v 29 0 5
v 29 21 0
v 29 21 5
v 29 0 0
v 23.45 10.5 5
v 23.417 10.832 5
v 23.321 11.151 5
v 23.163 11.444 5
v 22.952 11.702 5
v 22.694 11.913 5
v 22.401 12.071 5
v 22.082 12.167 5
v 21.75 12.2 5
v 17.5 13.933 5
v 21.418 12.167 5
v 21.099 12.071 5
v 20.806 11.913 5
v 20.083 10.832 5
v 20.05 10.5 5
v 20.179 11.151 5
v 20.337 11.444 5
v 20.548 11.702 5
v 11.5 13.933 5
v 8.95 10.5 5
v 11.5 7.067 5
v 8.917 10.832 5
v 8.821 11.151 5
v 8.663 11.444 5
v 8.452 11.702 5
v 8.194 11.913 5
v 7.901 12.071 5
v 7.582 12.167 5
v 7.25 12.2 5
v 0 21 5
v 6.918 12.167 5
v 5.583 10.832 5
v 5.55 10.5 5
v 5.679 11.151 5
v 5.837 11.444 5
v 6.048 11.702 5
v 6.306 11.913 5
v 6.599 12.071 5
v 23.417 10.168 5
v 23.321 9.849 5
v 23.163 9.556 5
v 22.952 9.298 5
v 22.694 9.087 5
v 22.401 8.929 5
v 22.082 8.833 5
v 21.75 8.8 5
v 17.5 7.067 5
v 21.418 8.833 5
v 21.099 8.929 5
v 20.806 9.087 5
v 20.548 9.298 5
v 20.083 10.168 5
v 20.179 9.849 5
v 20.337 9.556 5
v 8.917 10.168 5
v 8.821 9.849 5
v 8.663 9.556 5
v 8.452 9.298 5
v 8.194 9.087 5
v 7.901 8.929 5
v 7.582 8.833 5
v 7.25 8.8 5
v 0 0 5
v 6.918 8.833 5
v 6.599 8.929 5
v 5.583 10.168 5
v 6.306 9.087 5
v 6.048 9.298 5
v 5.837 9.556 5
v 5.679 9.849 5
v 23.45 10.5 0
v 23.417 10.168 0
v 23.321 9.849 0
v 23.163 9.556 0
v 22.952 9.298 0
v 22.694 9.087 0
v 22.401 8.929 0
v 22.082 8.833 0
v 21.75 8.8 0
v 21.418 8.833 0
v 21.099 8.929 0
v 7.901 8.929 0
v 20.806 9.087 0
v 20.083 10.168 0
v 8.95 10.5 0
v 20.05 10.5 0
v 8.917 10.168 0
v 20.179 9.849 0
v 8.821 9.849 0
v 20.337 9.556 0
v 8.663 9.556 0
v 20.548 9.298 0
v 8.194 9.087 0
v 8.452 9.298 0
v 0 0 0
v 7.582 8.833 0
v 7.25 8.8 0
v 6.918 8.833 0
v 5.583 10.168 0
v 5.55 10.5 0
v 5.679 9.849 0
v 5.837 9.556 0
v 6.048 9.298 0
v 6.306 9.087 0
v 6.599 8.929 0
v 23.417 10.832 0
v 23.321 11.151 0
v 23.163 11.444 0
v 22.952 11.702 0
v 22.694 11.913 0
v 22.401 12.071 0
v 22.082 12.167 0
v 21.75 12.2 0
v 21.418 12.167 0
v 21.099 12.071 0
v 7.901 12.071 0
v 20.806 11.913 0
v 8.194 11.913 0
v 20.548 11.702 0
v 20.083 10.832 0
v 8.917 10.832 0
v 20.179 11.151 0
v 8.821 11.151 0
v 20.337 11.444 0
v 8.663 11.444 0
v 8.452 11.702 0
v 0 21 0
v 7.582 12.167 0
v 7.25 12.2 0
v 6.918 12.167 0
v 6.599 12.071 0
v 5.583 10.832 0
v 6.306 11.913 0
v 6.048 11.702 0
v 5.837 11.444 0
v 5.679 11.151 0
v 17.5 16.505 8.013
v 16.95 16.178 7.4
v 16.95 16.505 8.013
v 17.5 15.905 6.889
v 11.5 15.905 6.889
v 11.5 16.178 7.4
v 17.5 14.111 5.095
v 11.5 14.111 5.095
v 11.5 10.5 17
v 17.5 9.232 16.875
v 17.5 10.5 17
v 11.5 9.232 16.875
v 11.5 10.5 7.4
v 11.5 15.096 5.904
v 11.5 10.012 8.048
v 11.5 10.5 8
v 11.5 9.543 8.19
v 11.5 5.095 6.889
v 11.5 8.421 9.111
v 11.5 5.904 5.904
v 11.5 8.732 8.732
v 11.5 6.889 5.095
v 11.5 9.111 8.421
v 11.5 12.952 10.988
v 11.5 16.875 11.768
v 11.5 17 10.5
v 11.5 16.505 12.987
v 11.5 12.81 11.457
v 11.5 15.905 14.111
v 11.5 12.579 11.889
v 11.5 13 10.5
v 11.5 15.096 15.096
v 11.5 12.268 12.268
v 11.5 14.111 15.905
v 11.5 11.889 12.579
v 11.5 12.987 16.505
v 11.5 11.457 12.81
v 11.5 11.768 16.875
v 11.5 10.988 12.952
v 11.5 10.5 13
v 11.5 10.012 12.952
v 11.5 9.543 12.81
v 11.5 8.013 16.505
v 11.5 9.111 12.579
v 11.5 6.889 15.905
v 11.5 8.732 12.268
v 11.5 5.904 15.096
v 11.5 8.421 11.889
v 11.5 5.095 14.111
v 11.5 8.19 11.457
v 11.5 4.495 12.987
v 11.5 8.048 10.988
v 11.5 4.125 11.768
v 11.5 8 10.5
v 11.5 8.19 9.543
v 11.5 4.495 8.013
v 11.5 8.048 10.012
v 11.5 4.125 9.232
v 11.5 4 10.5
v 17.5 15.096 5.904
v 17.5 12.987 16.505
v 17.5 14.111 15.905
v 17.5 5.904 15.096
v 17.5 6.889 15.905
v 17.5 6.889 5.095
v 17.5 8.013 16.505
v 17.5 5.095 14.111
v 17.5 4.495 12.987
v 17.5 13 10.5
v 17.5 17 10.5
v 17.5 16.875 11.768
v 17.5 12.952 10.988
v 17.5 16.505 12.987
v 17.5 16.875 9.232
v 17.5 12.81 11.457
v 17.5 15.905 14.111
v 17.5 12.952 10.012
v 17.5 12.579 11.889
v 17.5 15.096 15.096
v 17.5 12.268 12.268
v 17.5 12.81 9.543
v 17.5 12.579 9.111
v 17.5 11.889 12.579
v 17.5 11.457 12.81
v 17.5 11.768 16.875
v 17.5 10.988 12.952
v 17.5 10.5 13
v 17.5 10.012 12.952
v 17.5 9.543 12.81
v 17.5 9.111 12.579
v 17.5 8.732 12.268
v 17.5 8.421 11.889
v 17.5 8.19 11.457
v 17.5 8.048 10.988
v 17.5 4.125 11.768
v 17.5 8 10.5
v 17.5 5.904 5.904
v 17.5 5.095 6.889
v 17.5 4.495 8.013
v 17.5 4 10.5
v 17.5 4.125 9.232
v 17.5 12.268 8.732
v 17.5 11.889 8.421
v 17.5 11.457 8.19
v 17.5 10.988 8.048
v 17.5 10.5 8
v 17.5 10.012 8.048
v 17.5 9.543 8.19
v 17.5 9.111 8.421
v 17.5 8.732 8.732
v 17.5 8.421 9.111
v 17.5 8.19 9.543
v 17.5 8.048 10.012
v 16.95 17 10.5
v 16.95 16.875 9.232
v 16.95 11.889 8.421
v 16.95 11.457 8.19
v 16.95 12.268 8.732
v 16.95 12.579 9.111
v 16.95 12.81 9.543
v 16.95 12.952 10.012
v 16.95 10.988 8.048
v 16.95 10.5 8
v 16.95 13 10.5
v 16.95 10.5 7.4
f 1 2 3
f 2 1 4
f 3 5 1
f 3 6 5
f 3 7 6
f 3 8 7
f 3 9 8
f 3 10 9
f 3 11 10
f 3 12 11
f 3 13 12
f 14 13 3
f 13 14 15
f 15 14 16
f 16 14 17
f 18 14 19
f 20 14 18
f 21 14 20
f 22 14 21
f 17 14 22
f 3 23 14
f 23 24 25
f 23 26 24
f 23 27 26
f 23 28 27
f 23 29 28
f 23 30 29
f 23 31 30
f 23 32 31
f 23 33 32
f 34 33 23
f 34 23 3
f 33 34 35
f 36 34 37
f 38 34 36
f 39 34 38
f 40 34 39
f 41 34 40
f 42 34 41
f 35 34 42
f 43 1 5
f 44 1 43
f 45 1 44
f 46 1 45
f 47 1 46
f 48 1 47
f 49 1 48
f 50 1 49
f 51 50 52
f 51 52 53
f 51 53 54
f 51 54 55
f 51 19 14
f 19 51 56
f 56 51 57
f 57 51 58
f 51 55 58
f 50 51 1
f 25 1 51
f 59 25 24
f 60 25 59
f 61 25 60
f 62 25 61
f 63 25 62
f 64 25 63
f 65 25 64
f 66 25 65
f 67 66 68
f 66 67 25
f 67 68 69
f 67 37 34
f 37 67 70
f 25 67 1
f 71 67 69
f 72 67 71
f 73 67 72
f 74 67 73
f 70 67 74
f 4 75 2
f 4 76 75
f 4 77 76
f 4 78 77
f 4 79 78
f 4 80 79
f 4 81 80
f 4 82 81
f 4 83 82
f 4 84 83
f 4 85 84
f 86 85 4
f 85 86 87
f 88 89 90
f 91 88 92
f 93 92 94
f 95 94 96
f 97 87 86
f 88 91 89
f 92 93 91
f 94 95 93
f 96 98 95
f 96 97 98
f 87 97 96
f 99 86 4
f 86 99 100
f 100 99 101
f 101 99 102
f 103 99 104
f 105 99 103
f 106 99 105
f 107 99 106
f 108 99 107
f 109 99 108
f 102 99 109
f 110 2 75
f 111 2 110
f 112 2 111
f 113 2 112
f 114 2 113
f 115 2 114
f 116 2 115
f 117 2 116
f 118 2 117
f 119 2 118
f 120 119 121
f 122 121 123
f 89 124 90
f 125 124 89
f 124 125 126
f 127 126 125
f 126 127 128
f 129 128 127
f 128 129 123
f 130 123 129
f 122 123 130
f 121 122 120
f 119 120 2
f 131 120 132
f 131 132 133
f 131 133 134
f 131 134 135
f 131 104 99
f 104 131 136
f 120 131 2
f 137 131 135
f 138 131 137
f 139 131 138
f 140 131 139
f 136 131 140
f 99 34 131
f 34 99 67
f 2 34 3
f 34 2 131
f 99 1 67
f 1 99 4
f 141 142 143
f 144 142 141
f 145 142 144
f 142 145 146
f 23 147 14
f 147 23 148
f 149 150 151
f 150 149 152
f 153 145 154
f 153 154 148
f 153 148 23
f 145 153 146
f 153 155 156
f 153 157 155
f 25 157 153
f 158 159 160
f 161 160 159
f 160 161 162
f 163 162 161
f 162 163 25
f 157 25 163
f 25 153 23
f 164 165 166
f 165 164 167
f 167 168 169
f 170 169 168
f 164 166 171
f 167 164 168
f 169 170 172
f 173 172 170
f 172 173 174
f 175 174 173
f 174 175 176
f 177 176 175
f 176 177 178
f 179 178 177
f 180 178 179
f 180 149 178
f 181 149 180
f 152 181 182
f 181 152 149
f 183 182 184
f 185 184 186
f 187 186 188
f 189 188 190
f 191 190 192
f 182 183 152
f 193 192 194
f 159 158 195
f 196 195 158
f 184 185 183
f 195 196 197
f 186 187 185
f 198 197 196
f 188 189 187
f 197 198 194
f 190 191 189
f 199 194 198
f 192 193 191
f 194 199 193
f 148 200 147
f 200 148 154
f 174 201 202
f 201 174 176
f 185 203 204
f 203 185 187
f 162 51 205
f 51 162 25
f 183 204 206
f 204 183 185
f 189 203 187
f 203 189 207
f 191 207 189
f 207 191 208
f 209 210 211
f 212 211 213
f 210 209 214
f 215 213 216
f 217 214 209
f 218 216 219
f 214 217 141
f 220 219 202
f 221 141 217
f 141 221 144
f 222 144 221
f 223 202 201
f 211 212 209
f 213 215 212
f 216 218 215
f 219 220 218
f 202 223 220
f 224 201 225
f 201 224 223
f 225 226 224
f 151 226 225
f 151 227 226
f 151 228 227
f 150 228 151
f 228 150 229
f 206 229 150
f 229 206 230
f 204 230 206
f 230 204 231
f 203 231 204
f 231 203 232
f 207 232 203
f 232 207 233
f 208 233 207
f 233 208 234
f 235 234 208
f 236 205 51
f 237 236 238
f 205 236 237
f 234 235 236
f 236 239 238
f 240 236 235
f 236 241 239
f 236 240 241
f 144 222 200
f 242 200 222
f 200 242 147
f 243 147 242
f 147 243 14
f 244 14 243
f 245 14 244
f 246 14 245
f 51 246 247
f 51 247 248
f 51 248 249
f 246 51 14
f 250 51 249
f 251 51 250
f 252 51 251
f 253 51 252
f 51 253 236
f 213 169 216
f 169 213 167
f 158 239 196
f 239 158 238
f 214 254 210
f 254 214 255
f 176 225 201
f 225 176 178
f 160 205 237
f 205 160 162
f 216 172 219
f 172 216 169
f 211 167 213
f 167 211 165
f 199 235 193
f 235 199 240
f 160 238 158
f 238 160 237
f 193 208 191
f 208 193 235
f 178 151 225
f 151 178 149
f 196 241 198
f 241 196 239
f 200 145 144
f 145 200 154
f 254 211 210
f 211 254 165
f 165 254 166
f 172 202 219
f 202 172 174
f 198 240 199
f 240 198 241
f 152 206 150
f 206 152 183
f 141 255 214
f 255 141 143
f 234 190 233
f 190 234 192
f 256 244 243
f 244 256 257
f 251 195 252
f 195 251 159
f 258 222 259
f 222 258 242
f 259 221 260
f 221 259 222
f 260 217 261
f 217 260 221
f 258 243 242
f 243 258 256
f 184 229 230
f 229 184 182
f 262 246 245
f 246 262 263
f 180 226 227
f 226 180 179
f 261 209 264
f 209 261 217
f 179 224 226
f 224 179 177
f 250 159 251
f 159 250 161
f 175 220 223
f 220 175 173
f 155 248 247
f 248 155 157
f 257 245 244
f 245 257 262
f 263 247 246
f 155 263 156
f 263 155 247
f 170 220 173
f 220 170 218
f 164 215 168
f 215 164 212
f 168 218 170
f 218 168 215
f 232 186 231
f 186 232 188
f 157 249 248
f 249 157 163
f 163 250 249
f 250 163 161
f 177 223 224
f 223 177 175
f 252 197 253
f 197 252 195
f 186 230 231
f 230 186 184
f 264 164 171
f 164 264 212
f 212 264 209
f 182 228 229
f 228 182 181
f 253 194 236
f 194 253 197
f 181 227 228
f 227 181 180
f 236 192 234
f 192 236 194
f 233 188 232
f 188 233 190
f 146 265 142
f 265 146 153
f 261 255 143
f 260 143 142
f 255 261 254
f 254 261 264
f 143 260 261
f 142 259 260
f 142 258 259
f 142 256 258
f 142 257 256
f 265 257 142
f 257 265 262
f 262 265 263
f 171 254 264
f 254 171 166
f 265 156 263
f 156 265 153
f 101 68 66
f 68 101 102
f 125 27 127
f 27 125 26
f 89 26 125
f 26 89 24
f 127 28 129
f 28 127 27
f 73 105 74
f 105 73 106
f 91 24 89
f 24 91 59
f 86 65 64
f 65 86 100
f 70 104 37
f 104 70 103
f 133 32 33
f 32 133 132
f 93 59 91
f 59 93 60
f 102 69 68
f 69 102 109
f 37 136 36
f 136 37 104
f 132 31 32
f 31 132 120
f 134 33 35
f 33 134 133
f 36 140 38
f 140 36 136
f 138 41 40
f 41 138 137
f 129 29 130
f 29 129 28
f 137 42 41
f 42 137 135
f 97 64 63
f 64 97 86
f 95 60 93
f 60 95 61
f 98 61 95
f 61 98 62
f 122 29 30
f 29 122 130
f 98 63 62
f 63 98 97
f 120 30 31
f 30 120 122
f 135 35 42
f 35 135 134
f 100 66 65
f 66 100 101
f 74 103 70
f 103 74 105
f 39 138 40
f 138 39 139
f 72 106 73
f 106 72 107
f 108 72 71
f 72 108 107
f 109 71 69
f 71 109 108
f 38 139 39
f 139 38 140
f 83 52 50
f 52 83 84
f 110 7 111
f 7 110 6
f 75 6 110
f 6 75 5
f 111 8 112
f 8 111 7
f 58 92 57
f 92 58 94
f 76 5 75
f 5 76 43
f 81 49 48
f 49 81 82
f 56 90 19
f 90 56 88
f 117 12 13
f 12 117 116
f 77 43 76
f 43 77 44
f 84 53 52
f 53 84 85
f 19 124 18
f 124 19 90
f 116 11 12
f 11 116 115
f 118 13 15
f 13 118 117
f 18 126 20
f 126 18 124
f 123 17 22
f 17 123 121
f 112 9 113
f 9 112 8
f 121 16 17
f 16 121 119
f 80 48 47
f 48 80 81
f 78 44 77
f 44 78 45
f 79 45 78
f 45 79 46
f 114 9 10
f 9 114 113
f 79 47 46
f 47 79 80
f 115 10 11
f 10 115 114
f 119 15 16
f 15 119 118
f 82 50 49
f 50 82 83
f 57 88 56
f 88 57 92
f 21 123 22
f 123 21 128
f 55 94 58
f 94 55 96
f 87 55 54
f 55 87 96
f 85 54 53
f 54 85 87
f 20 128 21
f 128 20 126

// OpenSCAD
$fn = 32;

// ----------------------------------------------------------------------
// Cable clip: cable 5 mm, clamp 13 mm, base 29 mm
// ----------------------------------------------------------------------

// --- parameters (mm) ---
plate_x = 29;             // base length, X
plate_y = 21;             // base width, Y
plate_t = 5;              // base thickness
wire_seat_d = 13;         // clamp outside diameter
clip_t = 4;               // clamp wall
cable_d = 5;              // cable opening
ring_w = 6;               // clamp width along the cable
screw_d = 3.4;            // screw clearance
throat = 3.1;             // snap throat width
sink = 1;                 // overlap of the clamp into the base

module base() {
  cube([plate_x, plate_y, plate_t]);
}

module clamp() {
  translate([plate_x / 2, plate_y / 2, plate_t + wire_seat_d / 2 - sink]) rotate([0, 90, 0])
    cylinder(h = ring_w, d = wire_seat_d, center = true);
}

difference() {
  union() {
    base();
    clamp();
  }
  translate([plate_x / 2, plate_y / 2, plate_t + wire_seat_d / 2 - sink]) rotate([0, 90, 0]) translate([0, 0, -ring_w / 2 - 1]) cylinder(h = ring_w + 2, d = cable_d);
  /* snap throat: the opening is narrower than the cable */
  translate([plate_x / 2 - throat / 2, plate_y / 2, plate_t + wire_seat_d / 2 - sink]) rotate([0, 90, 0]) translate([0, 0, -ring_w / 2 - 1]) cube([throat, wire_seat_d + 2, ring_w + 2]);
  translate([7.25, plate_y / 2, -1]) cylinder(h = plate_t + 2, d = screw_d);
  translate([21.75, plate_y / 2, -1]) cylinder(h = plate_t + 2, d = screw_d);
}
